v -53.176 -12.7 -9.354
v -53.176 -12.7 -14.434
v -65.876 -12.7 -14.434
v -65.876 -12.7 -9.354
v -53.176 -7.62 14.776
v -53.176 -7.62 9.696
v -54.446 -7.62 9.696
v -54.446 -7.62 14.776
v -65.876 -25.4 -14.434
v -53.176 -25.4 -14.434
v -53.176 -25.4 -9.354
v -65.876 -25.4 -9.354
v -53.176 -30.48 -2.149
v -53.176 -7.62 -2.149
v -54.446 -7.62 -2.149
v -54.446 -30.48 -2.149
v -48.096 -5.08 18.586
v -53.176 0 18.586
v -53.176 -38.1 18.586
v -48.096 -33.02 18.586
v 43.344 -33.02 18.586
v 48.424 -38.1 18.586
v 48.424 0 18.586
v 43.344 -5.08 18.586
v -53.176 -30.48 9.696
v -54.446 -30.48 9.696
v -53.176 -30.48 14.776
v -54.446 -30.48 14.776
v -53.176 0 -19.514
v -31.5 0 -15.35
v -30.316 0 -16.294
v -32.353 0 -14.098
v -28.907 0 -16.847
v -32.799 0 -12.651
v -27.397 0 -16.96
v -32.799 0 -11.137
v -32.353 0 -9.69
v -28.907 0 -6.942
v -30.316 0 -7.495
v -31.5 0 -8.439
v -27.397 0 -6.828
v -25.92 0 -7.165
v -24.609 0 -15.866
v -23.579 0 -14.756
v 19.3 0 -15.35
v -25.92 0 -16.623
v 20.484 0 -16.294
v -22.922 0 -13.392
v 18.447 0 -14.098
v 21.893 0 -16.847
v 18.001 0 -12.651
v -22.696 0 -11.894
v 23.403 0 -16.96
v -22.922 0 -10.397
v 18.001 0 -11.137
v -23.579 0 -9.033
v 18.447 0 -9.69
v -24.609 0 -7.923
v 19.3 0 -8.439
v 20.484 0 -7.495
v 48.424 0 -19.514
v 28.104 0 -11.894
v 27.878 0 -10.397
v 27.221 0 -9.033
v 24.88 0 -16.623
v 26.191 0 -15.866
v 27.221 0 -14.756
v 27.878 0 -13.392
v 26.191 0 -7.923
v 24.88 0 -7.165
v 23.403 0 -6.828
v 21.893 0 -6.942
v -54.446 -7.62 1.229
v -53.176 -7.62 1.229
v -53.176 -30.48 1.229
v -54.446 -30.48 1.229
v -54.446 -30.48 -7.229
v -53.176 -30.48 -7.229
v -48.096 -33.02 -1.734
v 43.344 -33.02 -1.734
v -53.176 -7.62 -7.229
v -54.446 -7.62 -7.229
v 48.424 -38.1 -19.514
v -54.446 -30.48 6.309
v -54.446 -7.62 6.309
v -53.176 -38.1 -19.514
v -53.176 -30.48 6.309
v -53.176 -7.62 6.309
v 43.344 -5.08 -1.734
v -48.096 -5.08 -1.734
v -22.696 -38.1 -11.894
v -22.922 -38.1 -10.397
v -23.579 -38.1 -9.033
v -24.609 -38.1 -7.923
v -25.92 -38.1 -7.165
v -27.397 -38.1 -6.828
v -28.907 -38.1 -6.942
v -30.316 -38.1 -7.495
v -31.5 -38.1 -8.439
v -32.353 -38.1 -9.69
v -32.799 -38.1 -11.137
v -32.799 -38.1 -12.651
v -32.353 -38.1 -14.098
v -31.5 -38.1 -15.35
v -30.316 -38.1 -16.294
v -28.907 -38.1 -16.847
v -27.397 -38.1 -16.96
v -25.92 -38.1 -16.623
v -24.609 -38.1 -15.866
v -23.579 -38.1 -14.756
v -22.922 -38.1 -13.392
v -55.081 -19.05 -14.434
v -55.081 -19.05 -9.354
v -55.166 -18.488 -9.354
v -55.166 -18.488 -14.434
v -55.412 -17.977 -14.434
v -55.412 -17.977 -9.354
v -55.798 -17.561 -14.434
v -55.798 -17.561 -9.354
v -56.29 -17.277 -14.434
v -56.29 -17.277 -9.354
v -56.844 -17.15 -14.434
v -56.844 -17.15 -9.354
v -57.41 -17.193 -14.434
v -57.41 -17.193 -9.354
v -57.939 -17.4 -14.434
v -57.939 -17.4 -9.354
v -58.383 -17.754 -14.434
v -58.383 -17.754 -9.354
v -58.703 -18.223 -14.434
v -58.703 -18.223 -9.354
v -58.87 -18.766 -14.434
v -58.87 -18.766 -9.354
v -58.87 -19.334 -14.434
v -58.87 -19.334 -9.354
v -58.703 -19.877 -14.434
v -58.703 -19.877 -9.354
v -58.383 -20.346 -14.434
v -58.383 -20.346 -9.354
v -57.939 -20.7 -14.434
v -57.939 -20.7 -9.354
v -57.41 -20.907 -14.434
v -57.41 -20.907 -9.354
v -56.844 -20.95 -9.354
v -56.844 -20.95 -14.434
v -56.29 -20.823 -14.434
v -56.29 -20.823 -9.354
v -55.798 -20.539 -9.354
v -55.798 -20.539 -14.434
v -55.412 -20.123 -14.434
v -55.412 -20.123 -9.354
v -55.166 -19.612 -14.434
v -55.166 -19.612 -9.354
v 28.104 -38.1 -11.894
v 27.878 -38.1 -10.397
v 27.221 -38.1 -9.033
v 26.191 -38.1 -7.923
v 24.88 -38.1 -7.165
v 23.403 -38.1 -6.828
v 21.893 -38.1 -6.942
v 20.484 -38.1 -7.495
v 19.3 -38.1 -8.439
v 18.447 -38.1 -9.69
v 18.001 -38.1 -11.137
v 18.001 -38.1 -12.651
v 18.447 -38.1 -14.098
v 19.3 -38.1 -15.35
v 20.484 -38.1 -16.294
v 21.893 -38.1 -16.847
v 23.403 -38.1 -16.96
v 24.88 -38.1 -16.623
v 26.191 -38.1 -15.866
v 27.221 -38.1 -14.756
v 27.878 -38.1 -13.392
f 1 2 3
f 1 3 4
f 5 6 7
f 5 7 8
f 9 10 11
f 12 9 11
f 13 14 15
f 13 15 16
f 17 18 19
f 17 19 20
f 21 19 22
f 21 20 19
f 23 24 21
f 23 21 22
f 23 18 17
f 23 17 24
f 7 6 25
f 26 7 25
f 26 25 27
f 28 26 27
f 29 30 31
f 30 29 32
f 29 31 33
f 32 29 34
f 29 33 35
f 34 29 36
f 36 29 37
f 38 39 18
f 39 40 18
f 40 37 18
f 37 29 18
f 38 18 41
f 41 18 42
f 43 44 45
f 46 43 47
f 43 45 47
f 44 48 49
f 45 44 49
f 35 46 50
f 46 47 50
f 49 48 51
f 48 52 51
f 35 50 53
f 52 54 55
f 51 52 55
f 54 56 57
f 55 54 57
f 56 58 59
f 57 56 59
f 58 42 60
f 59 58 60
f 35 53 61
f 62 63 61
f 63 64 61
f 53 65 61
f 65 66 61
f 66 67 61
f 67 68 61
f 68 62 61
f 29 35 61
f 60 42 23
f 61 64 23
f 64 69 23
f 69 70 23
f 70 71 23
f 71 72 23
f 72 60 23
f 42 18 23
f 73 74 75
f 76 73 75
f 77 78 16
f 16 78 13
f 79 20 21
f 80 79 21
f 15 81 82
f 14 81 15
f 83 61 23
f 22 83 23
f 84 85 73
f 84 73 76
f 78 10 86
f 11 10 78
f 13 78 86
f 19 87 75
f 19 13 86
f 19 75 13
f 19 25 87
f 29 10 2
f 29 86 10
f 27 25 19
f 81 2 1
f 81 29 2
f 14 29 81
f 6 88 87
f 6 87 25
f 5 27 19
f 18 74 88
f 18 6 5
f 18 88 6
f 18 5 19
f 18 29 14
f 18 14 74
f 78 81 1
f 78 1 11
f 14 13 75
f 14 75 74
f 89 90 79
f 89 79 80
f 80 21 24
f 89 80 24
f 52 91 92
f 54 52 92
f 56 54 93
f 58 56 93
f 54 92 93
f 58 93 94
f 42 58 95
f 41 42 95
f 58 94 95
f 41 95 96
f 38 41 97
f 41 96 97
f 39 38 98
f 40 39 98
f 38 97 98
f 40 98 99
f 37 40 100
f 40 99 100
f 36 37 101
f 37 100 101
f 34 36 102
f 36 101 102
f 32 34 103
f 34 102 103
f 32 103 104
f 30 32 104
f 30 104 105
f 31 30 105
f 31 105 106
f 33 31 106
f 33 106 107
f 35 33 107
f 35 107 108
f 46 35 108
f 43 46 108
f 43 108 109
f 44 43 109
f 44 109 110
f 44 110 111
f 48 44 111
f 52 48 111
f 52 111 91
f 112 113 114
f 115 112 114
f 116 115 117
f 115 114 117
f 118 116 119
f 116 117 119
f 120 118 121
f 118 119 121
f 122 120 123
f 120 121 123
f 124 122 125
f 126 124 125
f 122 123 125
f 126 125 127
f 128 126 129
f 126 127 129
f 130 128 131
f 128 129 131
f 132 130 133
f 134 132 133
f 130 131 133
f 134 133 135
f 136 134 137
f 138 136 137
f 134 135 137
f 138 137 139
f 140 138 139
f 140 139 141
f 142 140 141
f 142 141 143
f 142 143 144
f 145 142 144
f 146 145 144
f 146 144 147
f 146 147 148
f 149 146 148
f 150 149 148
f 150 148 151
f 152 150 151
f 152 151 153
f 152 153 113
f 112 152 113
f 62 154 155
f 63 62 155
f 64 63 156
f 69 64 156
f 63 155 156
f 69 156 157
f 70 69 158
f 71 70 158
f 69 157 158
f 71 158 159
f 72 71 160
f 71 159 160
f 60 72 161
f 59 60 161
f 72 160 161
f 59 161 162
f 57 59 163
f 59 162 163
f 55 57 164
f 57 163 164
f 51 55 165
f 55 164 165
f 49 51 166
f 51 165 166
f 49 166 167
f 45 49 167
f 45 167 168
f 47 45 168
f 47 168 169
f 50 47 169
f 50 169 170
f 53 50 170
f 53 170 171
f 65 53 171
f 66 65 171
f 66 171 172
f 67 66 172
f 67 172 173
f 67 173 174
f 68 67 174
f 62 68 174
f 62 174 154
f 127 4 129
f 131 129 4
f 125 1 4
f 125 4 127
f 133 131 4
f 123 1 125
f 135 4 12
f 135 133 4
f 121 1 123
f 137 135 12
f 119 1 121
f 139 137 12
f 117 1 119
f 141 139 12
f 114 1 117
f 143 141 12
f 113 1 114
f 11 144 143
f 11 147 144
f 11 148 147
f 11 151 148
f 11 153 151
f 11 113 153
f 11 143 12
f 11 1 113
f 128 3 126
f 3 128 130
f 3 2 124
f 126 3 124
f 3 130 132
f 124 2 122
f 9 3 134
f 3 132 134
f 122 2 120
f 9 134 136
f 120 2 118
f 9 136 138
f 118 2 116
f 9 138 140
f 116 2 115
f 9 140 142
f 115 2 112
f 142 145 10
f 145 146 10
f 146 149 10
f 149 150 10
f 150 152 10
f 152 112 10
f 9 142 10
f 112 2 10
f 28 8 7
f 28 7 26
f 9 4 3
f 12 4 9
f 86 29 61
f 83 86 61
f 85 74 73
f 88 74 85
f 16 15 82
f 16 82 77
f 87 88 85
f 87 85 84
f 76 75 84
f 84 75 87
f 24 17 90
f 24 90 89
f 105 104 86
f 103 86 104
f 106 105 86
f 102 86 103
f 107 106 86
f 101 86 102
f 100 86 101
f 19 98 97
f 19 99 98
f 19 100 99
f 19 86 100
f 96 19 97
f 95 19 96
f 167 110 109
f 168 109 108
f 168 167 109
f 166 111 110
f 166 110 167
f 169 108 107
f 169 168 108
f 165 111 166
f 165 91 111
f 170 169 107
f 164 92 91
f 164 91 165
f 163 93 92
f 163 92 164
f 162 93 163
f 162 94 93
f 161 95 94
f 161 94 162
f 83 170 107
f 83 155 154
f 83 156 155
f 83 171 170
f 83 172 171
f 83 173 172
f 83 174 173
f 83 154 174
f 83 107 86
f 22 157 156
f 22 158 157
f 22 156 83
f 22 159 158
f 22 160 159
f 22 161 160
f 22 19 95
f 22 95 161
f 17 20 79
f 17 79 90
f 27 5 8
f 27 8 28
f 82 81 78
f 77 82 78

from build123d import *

# Parameters (mm, degrees)
F0_W      = 101.6
F0_H      = 38.1
F1_DEPTH  = 38.1
F2_W      = 91.44
F2_H      = 27.94
F3_DEPTH  = 20.32
F4_R      = 5.08
F5_DEPTH  = 38.101
F6_W      = 22.86
F6_H      = 5.08
F7_DEPTH  = 1.27
F8_W      = 12.7
F8_H      = 5.08
F9_DEPTH  = 12.7
F10_R     = 1.905
F11_DEPTH = 10.161


with BuildPart() as f1:
    # F0 (on Front) → F1 (new body)
    with BuildSketch(Plane.XZ):
        with Locations((-2.376233, -0.464275)):
            Rectangle(F0_W, F0_H)
    extrude(amount=F1_DEPTH)

    # F2 (on face) → F3 (cut)
    with BuildSketch(Plane.XY.offset(18.585725)):
        with Locations((-2.376233, -19.05)):
            Rectangle(F2_W, F2_H)
    extrude(amount=-F3_DEPTH, mode=Mode.SUBTRACT)

    # F4 (on face) → F5 (cut, through all)
    with BuildSketch(Plane.XZ.offset(38.1)):
        with Locations((-27.776233, -11.894275)):
            Circle(F4_R)
        with Locations((23.023767, -11.894275)):
            Circle(F4_R)
    extrude(amount=-F5_DEPTH, mode=Mode.SUBTRACT)

    # F6 (on face) → F7 (join)
    with BuildSketch(Plane(origin=(-53.176233, 0, 0), x_dir=(0, -1, 0), z_dir=(-1, 0, 0))):
        with Locations((19.05, 12.235725)):
            Rectangle(F6_W, F6_H)
        with Locations((19.05, 3.769143)):
            Rectangle(F6_W, F6_H)
        with Locations((19.05, -4.689057)):
            Rectangle(F6_W, F6_H)
    extrude(amount=F7_DEPTH)

    # F8 (on face) → F9 (join)
    with BuildSketch(Plane(origin=(-53.176233, 0, 0), x_dir=(0, -1, 0), z_dir=(-1, 0, 0))):
        with Locations((19.05, -11.894275)):
            Rectangle(F8_W, F8_H)
    extrude(amount=F9_DEPTH)

    # F10 (on face) → F11 (cut, through all)
    with BuildSketch(Plane.XY.offset(-9.354275)):
        with Locations((-56.986233, -19.05)):
            Circle(F10_R)
    extrude(amount=-F11_DEPTH, mode=Mode.SUBTRACT)


solid = f1.part
